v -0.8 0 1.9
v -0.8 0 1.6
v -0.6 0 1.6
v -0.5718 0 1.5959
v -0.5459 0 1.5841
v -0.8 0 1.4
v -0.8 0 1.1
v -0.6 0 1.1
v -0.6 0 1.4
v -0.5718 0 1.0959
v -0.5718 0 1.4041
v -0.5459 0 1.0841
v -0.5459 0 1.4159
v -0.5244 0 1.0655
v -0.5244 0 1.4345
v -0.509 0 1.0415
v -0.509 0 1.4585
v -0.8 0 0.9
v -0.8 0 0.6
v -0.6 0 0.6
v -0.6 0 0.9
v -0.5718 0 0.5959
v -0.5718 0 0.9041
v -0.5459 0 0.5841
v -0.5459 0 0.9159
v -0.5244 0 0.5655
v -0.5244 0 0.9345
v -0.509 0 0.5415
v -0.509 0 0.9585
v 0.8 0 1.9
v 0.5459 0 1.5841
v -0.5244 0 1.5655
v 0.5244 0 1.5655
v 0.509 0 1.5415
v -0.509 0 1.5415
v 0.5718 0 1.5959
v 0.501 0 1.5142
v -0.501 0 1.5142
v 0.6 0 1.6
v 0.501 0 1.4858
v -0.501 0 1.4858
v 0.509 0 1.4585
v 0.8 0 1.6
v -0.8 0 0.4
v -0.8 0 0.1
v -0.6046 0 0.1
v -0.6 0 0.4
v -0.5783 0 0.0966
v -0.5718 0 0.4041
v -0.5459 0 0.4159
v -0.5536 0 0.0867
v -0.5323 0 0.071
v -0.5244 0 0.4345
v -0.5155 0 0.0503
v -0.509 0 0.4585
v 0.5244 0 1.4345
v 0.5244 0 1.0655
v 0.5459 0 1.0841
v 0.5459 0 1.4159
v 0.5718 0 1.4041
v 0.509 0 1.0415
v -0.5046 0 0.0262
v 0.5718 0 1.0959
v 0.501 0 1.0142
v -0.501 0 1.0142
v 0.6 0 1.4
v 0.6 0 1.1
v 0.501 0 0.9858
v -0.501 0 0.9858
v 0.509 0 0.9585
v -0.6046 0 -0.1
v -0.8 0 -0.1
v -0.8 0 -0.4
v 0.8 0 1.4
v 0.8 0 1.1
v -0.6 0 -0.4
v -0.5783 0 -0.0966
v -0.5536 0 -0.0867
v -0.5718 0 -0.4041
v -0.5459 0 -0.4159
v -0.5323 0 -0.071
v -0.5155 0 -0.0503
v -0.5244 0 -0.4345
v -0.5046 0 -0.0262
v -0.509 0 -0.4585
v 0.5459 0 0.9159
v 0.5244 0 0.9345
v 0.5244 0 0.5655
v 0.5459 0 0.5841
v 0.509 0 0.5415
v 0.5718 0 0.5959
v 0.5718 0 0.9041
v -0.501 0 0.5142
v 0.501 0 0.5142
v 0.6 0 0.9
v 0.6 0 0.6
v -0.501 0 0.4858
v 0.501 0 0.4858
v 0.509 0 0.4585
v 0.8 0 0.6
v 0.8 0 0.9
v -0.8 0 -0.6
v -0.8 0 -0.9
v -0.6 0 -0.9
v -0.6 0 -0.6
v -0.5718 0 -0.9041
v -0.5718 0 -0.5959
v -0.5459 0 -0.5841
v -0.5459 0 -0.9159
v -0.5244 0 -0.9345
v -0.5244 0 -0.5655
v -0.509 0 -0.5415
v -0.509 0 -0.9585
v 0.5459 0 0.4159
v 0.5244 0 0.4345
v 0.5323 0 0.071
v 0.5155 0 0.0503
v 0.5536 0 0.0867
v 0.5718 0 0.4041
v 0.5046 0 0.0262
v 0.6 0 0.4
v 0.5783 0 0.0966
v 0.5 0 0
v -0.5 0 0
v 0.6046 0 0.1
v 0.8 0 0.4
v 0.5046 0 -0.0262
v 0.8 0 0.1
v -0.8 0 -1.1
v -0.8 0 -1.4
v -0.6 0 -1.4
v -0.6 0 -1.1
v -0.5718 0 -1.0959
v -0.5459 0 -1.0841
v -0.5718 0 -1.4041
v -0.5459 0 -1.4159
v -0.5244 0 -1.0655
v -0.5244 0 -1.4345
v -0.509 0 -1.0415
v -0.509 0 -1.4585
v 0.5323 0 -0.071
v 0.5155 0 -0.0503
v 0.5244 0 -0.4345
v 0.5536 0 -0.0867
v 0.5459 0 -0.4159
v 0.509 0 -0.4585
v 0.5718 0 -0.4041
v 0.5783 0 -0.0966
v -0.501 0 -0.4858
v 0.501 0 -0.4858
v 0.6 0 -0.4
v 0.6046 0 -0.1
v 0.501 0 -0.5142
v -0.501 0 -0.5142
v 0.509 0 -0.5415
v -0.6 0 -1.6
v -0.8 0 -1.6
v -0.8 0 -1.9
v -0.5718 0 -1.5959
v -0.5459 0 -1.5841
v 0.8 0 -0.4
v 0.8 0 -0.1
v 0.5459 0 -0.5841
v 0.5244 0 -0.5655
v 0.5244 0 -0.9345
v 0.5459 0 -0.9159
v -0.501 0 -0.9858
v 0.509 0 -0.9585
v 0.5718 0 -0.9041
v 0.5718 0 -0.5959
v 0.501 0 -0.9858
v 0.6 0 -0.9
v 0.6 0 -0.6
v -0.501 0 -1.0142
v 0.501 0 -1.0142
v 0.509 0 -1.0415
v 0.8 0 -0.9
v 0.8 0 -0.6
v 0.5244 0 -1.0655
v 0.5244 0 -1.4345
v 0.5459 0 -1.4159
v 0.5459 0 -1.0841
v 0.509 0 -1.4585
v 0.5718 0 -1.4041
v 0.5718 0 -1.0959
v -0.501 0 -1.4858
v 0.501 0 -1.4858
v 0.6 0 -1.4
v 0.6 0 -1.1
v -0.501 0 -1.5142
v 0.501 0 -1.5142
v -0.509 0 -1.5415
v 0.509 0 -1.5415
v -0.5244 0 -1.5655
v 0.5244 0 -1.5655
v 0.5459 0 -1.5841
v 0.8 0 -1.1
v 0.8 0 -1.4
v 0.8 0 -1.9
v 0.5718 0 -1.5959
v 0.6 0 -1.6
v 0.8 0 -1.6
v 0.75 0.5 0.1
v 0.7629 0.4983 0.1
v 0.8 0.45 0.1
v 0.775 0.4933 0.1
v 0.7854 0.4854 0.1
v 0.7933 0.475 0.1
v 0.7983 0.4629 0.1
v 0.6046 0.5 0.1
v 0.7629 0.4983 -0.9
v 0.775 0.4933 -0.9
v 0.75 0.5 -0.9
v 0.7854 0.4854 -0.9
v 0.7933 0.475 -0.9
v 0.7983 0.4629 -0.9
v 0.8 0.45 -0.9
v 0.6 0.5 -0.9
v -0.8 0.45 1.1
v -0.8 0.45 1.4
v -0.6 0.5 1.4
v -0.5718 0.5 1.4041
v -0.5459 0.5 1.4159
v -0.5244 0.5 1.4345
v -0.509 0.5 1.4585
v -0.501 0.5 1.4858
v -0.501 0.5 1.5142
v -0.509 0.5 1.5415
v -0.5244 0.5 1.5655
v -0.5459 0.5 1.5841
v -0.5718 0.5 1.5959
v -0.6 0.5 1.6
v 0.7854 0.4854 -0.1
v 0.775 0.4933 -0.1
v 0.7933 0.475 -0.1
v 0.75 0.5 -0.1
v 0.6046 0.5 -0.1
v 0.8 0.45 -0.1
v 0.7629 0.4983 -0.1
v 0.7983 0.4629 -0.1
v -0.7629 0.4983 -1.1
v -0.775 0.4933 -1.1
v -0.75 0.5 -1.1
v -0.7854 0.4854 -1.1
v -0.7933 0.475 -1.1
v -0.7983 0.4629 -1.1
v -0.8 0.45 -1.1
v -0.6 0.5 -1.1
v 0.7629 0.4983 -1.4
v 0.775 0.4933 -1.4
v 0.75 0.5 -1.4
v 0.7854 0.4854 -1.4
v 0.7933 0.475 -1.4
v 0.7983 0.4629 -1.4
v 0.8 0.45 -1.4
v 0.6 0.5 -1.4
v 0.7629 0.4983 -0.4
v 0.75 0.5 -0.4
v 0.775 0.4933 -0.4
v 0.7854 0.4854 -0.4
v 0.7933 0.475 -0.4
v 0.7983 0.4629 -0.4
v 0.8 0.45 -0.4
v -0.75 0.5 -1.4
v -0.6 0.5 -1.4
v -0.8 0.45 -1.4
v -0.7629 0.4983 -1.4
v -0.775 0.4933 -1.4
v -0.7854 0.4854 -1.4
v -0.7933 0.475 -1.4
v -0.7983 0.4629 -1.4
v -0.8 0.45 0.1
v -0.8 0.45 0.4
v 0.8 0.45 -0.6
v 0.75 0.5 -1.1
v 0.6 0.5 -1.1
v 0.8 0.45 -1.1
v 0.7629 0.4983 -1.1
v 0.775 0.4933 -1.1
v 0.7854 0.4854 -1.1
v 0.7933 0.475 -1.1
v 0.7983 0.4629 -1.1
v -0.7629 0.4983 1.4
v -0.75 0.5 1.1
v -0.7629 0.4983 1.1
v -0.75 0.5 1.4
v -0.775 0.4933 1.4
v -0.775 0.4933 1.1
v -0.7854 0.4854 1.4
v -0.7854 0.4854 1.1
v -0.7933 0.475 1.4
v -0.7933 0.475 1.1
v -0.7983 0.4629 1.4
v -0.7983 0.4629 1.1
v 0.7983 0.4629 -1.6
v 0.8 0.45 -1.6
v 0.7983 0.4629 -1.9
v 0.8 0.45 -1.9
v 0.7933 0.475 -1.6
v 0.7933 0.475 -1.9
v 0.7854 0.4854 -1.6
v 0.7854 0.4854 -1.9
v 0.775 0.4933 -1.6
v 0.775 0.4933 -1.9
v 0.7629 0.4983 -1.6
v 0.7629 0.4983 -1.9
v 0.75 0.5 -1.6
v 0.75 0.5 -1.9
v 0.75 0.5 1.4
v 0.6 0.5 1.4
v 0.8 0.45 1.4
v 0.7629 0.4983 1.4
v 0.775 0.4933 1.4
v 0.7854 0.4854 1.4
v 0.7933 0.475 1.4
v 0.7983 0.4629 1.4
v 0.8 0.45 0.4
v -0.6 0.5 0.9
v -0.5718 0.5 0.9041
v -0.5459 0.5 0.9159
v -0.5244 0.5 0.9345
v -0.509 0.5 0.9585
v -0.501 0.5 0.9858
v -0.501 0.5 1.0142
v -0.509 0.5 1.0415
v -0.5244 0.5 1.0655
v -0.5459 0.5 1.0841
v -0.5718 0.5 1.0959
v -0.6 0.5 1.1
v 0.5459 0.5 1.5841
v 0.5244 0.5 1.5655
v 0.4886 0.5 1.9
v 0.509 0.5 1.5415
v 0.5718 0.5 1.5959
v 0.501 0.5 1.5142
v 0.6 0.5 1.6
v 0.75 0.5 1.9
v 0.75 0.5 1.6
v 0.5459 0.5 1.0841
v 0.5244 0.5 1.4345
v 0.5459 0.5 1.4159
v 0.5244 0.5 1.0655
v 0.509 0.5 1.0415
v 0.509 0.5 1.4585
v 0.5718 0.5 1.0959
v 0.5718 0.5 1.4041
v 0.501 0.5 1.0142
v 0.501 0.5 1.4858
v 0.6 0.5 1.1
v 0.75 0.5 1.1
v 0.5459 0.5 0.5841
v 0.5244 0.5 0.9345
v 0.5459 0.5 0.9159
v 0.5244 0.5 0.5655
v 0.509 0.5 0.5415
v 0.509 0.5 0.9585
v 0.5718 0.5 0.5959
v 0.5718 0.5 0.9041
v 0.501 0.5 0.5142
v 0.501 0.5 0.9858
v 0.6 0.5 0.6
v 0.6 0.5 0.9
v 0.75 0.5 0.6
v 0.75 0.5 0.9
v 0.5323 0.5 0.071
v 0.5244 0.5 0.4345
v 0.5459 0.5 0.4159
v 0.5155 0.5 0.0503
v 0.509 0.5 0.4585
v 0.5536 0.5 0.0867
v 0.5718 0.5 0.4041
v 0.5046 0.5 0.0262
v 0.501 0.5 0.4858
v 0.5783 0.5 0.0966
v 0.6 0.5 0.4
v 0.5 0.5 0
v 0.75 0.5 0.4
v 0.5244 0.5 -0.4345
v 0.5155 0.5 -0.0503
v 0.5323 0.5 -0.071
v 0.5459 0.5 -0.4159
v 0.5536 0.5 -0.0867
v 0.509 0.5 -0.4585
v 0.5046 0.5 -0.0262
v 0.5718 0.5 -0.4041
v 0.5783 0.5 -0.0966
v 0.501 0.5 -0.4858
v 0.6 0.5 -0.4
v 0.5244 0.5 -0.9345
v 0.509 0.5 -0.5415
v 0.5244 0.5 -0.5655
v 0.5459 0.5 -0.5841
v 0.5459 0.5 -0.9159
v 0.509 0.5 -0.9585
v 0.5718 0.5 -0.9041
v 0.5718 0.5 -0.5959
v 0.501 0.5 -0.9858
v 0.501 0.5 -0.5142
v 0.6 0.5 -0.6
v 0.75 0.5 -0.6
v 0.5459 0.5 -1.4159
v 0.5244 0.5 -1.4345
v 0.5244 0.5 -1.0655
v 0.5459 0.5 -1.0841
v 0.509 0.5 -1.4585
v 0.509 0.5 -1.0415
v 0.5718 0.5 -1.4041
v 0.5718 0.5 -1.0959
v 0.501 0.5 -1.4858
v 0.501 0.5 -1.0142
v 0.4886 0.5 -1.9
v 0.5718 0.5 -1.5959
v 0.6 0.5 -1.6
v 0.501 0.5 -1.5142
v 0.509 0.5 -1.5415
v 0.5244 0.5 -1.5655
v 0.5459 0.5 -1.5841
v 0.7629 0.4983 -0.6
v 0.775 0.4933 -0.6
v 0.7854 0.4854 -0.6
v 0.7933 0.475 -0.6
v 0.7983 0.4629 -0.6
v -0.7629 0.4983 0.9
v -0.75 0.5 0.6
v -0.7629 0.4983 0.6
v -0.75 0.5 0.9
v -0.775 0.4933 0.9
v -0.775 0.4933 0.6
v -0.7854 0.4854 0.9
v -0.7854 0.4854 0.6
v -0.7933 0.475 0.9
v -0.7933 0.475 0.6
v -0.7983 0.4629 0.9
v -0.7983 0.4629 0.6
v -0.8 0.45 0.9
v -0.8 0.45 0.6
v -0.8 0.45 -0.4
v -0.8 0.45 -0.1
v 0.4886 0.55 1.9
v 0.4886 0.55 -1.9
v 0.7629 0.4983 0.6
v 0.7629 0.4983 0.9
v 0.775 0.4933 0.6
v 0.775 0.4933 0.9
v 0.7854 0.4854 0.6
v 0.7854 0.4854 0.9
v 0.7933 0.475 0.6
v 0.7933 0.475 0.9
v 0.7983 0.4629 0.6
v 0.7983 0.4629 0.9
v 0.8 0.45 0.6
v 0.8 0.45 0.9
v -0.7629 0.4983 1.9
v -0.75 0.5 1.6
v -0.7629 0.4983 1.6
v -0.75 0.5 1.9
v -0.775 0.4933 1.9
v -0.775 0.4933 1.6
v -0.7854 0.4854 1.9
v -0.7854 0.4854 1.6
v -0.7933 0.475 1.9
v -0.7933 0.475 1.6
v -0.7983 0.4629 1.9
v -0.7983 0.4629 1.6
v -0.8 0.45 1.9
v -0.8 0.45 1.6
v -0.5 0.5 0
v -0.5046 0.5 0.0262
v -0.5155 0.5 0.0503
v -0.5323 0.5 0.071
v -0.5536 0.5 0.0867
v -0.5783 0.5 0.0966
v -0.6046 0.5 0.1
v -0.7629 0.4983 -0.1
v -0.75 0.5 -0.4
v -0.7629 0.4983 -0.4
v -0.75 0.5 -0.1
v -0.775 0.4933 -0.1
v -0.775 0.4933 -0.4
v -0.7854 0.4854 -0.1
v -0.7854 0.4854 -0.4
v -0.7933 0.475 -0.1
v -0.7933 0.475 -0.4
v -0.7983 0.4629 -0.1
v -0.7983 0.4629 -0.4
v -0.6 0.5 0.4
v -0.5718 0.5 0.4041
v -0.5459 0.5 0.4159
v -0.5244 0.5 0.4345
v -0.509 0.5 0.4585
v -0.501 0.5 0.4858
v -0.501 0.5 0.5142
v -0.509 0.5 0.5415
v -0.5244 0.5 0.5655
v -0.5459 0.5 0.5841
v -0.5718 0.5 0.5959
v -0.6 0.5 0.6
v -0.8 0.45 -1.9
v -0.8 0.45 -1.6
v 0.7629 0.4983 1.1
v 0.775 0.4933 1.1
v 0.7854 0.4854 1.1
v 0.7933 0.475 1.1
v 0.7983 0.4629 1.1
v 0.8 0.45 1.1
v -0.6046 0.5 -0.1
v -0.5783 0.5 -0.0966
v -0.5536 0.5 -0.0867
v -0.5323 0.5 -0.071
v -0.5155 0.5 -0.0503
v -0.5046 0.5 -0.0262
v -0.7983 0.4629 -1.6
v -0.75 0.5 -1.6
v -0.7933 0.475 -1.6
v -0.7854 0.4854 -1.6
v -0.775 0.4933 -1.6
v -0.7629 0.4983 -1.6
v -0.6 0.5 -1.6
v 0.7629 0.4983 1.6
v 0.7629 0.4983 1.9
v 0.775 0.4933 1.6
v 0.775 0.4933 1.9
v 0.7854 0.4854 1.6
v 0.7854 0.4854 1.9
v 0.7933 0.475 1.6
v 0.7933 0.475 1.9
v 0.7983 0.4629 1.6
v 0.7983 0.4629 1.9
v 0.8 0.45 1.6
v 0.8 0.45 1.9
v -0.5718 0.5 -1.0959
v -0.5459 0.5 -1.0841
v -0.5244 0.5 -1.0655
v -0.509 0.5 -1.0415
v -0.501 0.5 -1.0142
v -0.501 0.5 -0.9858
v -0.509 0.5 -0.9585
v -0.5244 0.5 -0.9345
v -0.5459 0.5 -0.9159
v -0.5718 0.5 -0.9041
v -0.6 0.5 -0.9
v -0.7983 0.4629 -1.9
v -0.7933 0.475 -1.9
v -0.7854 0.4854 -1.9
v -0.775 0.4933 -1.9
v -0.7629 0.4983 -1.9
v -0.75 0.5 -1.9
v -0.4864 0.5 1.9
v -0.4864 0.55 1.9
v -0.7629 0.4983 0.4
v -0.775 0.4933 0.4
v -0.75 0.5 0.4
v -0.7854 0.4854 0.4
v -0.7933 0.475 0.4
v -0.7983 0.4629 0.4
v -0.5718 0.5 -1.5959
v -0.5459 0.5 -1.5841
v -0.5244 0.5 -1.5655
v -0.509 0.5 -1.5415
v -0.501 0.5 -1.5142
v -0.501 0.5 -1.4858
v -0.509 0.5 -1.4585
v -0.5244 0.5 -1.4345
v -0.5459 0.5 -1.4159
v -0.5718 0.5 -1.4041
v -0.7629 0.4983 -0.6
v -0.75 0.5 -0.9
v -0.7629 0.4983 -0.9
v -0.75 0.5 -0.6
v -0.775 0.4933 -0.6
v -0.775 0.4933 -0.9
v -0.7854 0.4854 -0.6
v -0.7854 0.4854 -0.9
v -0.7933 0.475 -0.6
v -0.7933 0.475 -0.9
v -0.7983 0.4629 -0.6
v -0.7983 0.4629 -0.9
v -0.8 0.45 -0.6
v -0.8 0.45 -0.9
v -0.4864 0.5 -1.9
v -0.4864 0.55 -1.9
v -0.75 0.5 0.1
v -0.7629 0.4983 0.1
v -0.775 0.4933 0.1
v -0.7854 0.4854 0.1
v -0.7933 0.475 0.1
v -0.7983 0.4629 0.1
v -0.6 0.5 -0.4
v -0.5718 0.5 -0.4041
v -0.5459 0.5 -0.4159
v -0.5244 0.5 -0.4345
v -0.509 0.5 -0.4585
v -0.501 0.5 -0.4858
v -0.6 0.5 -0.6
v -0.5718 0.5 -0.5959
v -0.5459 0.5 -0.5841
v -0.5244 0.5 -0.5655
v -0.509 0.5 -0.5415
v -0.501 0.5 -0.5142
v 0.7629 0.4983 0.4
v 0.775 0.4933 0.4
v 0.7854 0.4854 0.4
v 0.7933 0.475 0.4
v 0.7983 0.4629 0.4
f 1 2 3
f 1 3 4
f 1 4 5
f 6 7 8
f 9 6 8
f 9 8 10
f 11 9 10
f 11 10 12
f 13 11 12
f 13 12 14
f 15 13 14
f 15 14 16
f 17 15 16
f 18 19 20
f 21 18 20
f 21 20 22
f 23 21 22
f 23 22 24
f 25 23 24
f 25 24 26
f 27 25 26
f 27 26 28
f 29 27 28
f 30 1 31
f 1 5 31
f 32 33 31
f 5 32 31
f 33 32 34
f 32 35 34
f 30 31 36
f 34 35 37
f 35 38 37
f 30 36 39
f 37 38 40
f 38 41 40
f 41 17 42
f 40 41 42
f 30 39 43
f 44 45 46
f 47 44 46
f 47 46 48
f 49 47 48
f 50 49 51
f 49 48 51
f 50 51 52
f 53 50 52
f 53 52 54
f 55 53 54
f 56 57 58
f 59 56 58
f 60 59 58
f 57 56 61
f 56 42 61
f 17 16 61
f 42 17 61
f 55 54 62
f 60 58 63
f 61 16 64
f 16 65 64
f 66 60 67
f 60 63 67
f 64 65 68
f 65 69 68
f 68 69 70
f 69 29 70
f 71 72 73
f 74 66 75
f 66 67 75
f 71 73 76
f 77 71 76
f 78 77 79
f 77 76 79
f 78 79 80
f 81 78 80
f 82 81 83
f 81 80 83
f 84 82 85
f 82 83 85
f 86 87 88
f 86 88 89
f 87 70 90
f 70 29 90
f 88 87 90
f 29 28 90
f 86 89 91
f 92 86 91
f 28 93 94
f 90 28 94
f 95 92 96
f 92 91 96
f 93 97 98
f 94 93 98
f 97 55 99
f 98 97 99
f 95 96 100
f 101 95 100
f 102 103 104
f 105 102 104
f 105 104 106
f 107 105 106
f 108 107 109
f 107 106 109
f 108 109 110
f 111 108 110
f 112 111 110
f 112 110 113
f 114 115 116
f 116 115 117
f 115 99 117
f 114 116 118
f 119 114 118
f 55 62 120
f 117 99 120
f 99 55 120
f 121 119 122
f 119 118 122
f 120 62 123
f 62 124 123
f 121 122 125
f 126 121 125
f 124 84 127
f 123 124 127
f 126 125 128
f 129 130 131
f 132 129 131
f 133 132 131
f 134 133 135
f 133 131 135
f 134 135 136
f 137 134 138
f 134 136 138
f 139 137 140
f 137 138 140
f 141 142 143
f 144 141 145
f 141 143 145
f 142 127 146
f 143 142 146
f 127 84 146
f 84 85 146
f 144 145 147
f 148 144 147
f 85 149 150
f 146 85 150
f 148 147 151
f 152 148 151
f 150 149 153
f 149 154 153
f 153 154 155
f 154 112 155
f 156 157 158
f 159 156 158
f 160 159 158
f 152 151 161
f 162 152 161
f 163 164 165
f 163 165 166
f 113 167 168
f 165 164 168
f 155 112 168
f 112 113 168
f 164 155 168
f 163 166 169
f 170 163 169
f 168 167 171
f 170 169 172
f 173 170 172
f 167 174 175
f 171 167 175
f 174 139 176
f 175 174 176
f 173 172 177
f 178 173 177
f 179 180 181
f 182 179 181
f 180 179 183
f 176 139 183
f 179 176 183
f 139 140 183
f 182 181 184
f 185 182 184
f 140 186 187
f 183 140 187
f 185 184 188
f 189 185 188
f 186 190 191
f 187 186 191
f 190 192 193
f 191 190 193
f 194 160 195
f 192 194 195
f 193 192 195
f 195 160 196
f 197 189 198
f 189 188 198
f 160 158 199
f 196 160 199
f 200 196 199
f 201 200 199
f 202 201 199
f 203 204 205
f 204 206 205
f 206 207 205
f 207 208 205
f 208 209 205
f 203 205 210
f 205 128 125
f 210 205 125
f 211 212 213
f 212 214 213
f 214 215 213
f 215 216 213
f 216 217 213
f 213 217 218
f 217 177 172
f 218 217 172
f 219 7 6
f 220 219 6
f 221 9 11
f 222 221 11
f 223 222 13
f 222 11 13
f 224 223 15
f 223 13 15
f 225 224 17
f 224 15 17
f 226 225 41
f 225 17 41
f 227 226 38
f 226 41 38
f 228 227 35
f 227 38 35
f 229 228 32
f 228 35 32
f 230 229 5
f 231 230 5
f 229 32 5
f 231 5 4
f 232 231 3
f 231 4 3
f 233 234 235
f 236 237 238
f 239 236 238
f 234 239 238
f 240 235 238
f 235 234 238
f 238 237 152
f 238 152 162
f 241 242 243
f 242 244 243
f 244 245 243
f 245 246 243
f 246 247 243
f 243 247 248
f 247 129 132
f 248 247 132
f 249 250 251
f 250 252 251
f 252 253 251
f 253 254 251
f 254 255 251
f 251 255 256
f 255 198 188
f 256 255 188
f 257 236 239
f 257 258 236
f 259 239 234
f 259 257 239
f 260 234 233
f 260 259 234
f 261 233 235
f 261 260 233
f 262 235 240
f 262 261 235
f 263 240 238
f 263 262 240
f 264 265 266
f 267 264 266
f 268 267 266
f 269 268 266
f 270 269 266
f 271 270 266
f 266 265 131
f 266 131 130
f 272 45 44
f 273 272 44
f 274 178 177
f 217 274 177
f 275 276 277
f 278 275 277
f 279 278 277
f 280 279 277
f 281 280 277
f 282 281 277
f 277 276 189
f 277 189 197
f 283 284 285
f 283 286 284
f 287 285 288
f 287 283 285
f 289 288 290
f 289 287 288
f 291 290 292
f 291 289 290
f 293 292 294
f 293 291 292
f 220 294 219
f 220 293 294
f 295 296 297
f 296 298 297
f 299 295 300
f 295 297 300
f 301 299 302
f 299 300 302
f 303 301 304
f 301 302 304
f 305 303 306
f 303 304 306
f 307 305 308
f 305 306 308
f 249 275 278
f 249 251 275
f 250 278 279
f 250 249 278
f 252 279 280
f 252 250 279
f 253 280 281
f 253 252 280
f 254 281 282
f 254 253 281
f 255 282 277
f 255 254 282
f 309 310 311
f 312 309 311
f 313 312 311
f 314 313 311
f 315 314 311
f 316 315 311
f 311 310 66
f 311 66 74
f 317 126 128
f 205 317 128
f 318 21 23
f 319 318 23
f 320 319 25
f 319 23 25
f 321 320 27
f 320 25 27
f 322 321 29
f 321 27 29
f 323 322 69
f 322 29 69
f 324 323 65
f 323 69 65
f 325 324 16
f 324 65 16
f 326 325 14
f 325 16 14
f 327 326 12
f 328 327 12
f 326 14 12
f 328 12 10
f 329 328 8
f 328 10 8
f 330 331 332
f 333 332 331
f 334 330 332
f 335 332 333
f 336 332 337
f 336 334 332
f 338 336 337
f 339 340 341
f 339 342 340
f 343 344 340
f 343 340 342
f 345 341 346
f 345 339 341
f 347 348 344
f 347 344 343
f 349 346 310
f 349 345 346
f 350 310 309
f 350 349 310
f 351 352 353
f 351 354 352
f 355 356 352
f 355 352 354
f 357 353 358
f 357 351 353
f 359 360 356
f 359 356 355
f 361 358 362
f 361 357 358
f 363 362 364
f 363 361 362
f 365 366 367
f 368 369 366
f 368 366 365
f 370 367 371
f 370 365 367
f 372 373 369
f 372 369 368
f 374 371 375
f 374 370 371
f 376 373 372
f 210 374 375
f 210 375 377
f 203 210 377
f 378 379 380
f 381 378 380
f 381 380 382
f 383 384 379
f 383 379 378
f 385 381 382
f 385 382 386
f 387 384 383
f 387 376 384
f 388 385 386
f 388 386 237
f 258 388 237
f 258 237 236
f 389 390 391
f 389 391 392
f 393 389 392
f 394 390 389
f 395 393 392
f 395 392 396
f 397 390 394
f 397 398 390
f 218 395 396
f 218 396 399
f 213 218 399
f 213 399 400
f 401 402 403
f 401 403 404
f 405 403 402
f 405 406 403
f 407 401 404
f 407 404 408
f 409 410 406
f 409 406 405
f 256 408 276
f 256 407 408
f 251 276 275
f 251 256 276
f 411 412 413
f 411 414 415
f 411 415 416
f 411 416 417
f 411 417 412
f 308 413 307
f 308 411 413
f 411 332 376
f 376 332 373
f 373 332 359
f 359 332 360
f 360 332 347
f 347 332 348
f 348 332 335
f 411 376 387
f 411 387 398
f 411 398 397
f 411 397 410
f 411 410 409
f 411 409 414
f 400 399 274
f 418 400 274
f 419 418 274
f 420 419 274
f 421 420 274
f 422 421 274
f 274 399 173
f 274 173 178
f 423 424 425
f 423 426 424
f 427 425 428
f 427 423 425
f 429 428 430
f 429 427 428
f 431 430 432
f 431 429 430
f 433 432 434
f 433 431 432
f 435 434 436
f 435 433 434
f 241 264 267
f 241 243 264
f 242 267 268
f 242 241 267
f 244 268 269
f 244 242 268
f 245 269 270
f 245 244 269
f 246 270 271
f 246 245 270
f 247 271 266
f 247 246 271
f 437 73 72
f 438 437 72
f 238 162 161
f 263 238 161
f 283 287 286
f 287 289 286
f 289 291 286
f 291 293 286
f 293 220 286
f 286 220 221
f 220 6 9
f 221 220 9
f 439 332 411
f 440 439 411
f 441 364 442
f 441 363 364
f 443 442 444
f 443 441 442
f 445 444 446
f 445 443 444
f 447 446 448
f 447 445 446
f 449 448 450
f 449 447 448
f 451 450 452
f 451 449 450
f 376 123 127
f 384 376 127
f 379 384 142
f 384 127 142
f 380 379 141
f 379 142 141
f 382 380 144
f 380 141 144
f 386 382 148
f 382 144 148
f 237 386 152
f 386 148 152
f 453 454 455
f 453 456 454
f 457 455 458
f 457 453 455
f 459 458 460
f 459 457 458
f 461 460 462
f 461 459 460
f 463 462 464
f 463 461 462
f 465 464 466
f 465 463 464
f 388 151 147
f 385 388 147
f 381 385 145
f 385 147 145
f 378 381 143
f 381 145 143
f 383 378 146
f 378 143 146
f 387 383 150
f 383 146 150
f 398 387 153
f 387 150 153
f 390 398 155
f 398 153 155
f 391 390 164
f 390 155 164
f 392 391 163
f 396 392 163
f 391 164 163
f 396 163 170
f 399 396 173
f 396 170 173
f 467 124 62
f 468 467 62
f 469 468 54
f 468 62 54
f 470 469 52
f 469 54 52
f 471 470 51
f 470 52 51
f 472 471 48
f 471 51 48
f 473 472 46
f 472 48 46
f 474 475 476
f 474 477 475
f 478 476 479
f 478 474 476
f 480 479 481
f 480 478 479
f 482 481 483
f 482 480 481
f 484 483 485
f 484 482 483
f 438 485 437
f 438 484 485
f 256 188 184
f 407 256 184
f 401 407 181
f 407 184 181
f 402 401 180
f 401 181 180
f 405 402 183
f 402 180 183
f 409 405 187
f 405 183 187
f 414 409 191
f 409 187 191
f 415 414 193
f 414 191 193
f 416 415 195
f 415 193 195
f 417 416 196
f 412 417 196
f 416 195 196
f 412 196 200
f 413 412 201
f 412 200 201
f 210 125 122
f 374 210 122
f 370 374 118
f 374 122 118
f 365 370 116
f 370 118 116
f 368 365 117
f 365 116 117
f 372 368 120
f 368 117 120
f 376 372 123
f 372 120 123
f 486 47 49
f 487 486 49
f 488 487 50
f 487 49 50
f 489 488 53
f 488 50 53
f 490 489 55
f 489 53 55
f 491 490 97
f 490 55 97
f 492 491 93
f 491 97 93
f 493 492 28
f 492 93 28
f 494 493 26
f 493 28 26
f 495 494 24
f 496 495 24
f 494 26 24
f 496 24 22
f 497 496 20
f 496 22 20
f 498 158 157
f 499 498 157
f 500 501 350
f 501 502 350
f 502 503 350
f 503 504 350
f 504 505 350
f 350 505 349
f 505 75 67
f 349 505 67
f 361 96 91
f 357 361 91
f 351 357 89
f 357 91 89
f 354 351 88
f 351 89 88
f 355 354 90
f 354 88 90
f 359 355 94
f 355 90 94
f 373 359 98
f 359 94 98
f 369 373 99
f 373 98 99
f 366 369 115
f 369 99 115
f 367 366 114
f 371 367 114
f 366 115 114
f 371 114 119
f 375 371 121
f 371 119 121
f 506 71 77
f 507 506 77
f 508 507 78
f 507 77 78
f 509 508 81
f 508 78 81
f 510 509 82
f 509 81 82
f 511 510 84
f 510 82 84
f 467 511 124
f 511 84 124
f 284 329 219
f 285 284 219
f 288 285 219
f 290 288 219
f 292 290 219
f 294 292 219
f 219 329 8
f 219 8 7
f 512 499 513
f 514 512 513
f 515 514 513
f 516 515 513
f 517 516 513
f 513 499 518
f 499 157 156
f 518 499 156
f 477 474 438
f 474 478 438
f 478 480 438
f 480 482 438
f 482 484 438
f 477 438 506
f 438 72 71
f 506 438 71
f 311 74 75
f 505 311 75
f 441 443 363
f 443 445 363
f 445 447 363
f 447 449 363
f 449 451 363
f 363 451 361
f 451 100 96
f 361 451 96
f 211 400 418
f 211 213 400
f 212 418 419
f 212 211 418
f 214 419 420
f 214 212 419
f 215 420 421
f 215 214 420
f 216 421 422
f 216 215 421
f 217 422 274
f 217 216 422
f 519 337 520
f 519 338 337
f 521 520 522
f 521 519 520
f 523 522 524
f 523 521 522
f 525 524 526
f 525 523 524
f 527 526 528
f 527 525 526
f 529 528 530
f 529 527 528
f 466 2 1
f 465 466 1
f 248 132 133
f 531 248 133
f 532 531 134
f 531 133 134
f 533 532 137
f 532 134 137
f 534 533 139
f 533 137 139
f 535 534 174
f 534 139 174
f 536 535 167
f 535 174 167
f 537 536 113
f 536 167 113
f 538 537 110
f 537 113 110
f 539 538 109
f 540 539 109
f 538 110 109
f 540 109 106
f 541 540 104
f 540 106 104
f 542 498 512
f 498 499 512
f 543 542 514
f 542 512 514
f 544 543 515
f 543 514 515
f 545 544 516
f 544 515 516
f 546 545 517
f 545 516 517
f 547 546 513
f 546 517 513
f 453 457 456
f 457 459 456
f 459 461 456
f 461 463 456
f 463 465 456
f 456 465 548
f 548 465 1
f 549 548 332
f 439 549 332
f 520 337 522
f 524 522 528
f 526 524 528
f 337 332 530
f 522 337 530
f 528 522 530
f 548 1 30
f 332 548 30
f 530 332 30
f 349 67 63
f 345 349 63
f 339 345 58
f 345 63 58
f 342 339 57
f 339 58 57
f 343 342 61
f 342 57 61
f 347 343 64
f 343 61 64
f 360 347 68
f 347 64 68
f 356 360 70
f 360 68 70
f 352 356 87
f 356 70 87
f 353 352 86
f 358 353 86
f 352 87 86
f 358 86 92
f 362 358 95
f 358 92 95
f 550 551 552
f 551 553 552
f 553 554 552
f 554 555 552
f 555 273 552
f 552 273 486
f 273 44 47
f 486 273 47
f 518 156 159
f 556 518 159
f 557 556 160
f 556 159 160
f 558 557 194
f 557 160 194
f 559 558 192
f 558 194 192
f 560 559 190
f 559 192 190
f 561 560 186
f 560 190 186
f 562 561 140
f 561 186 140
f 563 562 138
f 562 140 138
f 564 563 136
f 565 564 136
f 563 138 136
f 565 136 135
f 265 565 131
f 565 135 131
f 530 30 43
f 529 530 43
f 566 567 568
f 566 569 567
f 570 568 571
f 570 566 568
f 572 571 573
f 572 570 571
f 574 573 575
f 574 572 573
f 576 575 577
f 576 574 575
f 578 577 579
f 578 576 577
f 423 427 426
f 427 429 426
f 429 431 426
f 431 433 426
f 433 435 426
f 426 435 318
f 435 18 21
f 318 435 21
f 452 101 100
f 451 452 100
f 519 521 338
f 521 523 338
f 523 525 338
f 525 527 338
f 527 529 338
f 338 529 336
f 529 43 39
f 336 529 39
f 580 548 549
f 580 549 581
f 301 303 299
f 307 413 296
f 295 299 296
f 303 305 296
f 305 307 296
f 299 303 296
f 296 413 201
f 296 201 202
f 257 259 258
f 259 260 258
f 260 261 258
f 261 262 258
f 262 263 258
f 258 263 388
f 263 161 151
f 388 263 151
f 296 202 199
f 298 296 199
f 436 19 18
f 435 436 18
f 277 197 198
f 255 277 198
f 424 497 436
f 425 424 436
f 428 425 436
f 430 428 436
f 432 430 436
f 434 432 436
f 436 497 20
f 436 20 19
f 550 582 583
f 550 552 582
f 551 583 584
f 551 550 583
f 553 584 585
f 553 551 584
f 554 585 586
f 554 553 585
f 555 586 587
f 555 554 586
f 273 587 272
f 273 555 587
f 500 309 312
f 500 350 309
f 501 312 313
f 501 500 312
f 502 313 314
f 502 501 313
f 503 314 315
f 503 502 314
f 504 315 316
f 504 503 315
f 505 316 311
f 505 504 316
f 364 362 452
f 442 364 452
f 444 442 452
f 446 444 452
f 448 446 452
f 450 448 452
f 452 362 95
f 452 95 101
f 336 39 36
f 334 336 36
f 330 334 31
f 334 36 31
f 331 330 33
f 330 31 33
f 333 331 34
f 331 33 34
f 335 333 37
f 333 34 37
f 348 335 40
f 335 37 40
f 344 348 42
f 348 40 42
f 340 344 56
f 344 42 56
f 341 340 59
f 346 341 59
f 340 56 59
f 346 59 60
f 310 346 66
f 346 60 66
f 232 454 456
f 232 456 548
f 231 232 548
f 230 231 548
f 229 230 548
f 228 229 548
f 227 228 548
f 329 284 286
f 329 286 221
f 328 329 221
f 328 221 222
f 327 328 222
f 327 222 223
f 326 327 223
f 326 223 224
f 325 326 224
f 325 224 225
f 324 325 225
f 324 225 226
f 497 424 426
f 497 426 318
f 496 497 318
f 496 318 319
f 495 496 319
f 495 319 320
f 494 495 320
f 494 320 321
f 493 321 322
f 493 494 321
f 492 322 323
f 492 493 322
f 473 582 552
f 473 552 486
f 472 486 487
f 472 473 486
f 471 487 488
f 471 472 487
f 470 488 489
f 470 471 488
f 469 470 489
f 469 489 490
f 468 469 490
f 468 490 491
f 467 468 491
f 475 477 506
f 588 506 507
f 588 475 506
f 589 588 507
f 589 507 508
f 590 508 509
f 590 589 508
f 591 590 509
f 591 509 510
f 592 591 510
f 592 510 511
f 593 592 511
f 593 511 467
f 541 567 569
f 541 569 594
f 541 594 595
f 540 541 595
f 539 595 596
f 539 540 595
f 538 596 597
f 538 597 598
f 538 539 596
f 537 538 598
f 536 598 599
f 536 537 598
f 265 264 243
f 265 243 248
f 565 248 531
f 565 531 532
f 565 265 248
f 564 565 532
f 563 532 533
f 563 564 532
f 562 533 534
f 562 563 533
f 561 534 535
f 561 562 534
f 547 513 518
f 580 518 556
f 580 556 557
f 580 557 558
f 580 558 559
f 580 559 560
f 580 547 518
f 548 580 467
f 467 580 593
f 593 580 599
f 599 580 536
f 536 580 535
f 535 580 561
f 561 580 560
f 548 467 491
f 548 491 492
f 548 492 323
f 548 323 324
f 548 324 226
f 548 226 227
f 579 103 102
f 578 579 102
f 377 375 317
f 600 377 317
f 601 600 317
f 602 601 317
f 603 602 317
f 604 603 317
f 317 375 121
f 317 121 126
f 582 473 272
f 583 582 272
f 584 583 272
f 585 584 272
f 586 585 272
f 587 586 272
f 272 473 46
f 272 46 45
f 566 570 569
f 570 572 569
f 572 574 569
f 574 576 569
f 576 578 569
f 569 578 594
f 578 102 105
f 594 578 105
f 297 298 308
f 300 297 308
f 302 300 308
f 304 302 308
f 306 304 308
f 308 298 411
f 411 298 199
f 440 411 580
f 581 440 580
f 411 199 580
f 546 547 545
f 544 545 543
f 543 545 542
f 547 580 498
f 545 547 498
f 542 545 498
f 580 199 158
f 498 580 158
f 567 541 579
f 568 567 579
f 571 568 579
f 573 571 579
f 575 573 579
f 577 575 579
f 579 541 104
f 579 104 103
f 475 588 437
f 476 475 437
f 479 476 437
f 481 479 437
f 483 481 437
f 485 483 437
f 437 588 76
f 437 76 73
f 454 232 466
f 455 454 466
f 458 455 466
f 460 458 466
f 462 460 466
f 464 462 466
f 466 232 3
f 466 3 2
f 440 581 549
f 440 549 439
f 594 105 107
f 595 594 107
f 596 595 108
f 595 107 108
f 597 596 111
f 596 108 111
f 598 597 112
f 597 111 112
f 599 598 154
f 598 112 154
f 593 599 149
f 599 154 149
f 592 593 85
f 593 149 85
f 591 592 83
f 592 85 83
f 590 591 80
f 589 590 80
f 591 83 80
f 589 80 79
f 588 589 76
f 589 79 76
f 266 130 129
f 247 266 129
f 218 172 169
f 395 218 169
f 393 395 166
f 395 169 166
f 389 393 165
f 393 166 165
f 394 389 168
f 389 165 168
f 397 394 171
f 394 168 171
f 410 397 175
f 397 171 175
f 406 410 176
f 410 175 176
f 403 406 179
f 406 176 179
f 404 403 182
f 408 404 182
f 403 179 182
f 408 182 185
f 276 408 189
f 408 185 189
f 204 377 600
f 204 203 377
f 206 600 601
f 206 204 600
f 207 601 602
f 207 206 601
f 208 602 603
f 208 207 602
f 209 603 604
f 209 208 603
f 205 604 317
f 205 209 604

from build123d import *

# Parameters (mm, degrees)
BOSS_EXTRUDE1_DEPTH = 0.5
SKETCH2_W           = 0.974965632
SKETCH2_H           = 3.8
BOSS_EXTRUDE2_DEPTH = 0.05
FILLET2_R           = 0.05


with BuildPart() as part:
    # Sketch1 → Boss-Extrude1 (new body)
    with BuildSketch(Plane(origin=(0, 0, 0), x_dir=(1, 0, 0), z_dir=(0, 1, 0))):
        with BuildLine():
            Line((-0.8, 1.9), (-0.8, 1.6))
            Line((-0.8, 1.6), (-0.6, 1.6))
            ThreePointArc((-0.6, 1.6), (-0.5, 1.5), (-0.6, 1.4))
            Line((-0.6, 1.4), (-0.8, 1.4))
            Line((-0.8, 1.4), (-0.8, 1.1))
            Line((-0.8, 1.1), (-0.6, 1.1))
            ThreePointArc((-0.6, 1.1), (-0.5, 1), (-0.6, 0.9))
            Line((-0.6, 0.9), (-0.8, 0.9))
            Line((-0.8, 0.9), (-0.8, 0.6))
            Line((-0.8, 0.6), (-0.6, 0.6))
            ThreePointArc((-0.6, 0.6), (-0.5, 0.5), (-0.6, 0.4))
            Line((-0.6, 0.4), (-0.8, 0.4))
            Line((-0.8, 0.4), (-0.8, 0.1))
            Line((-0.8, 0.1), (-0.604637585, 0.1))
            ThreePointArc((-0.604637585, 0.1), (-0.532268697, 0.070979936), (-0.5, 0))
            ThreePointArc((-0.5, 0), (-0.532268697, -0.070979936), (-0.604637585, -0.1))
            Line((-0.604637585, -0.1), (-0.8, -0.1))
            Line((-0.8, -0.1), (-0.8, -0.4))
            Line((-0.8, -0.4), (-0.6, -0.4))
            ThreePointArc((-0.6, -0.4), (-0.5, -0.5), (-0.6, -0.6))
            Line((-0.6, -0.6), (-0.8, -0.6))
            Line((-0.8, -0.6), (-0.8, -0.9))
            Line((-0.8, -0.9), (-0.6, -0.9))
            ThreePointArc((-0.6, -0.9), (-0.5, -1), (-0.6, -1.1))
            Line((-0.6, -1.1), (-0.8, -1.1))
            Line((-0.8, -1.1), (-0.8, -1.4))
            Line((-0.8, -1.4), (-0.6, -1.4))
            ThreePointArc((-0.6, -1.4), (-0.5, -1.5), (-0.6, -1.6))
            Line((-0.6, -1.6), (-0.8, -1.6))
            Line((-0.8, -1.6), (-0.8, -1.9))
            Line((-0.8, -1.9), (0.8, -1.9))
            Line((0.8, -1.9), (0.8, -1.6))
            Line((0.8, -1.6), (0.6, -1.6))
            ThreePointArc((0.6, -1.6), (0.5, -1.5), (0.6, -1.4))
            Line((0.6, -1.4), (0.8, -1.4))
            Line((0.8, -1.4), (0.8, -1.1))
            Line((0.8, -1.1), (0.6, -1.1))
            ThreePointArc((0.6, -1.1), (0.5, -1), (0.6, -0.9))
            Line((0.6, -0.9), (0.8, -0.9))
            Line((0.8, -0.9), (0.8, -0.6))
            Line((0.8, -0.6), (0.6, -0.6))
            ThreePointArc((0.6, -0.6), (0.5, -0.5), (0.6, -0.4))
            Line((0.6, -0.4), (0.8, -0.4))
            Line((0.8, -0.4), (0.8, -0.1))
            Line((0.8, -0.1), (0.604637585, -0.1))
            ThreePointArc((0.604637585, -0.1), (0.532268697, -0.070979936), (0.5, 0))
            ThreePointArc((0.5, 0), (0.532268697, 0.070979936), (0.604637585, 0.1))
            Line((0.604637585, 0.1), (0.8, 0.1))
            Line((0.8, 0.1), (0.8, 0.4))
            Line((0.8, 0.4), (0.6, 0.4))
            ThreePointArc((0.6, 0.4), (0.5, 0.5), (0.6, 0.6))
            Line((0.6, 0.6), (0.8, 0.6))
            Line((0.8, 0.6), (0.8, 0.9))
            Line((0.8, 0.9), (0.6, 0.9))
            ThreePointArc((0.6, 0.9), (0.5, 1), (0.6, 1.1))
            Line((0.6, 1.1), (0.8, 1.1))
            Line((0.8, 1.1), (0.8, 1.4))
            Line((0.8, 1.4), (0.6, 1.4))
            ThreePointArc((0.6, 1.4), (0.5, 1.5), (0.6, 1.6))
            Line((0.6, 1.6), (0.8, 1.6))
            Line((0.8, 1.6), (0.8, 1.9))
            Line((0.8, 1.9), (-0.8, 1.9))
        make_face()
    extrude(amount=BOSS_EXTRUDE1_DEPTH)

    # Sketch2 → Boss-Extrude2 (add)
    with BuildSketch(Plane(origin=(0, 0.5, 0), x_dir=(1, 0, 0), z_dir=(0, 1, 0))):
        with Locations((0.001088626, 0)):
            Rectangle(SKETCH2_W, SKETCH2_H)
    extrude(amount=BOSS_EXTRUDE2_DEPTH)

    # Fillet2
    fillet2_edges = [part.edges().sort_by_distance(p)[0] for p in [
        (-0.8, 0.5, 1.25),
        (-0.8, 0.5, 1.75),
        (-0.8, 0.5, -1.75),
        (0.8, 0.5, 1.75),
        (0.8, 0.5, 1.25),
        (0.8, 0.5, 0.75),
        (0.8, 0.5, 0.25),
        (0.8, 0.5, -0.25),
        (0.8, 0.5, -0.75),
        (0.8, 0.5, -1.25),
        (-0.8, 0.5, -1.25),
        (-0.8, 0.5, -0.75),
        (0.8, 0.5, -1.75),
        (-0.8, 0.5, -0.25),
        (-0.8, 0.5, 0.25),
        (-0.8, 0.5, 0.75),
    ]]
    fillet(fillet2_edges, radius=FILLET2_R)


solid = part.part
